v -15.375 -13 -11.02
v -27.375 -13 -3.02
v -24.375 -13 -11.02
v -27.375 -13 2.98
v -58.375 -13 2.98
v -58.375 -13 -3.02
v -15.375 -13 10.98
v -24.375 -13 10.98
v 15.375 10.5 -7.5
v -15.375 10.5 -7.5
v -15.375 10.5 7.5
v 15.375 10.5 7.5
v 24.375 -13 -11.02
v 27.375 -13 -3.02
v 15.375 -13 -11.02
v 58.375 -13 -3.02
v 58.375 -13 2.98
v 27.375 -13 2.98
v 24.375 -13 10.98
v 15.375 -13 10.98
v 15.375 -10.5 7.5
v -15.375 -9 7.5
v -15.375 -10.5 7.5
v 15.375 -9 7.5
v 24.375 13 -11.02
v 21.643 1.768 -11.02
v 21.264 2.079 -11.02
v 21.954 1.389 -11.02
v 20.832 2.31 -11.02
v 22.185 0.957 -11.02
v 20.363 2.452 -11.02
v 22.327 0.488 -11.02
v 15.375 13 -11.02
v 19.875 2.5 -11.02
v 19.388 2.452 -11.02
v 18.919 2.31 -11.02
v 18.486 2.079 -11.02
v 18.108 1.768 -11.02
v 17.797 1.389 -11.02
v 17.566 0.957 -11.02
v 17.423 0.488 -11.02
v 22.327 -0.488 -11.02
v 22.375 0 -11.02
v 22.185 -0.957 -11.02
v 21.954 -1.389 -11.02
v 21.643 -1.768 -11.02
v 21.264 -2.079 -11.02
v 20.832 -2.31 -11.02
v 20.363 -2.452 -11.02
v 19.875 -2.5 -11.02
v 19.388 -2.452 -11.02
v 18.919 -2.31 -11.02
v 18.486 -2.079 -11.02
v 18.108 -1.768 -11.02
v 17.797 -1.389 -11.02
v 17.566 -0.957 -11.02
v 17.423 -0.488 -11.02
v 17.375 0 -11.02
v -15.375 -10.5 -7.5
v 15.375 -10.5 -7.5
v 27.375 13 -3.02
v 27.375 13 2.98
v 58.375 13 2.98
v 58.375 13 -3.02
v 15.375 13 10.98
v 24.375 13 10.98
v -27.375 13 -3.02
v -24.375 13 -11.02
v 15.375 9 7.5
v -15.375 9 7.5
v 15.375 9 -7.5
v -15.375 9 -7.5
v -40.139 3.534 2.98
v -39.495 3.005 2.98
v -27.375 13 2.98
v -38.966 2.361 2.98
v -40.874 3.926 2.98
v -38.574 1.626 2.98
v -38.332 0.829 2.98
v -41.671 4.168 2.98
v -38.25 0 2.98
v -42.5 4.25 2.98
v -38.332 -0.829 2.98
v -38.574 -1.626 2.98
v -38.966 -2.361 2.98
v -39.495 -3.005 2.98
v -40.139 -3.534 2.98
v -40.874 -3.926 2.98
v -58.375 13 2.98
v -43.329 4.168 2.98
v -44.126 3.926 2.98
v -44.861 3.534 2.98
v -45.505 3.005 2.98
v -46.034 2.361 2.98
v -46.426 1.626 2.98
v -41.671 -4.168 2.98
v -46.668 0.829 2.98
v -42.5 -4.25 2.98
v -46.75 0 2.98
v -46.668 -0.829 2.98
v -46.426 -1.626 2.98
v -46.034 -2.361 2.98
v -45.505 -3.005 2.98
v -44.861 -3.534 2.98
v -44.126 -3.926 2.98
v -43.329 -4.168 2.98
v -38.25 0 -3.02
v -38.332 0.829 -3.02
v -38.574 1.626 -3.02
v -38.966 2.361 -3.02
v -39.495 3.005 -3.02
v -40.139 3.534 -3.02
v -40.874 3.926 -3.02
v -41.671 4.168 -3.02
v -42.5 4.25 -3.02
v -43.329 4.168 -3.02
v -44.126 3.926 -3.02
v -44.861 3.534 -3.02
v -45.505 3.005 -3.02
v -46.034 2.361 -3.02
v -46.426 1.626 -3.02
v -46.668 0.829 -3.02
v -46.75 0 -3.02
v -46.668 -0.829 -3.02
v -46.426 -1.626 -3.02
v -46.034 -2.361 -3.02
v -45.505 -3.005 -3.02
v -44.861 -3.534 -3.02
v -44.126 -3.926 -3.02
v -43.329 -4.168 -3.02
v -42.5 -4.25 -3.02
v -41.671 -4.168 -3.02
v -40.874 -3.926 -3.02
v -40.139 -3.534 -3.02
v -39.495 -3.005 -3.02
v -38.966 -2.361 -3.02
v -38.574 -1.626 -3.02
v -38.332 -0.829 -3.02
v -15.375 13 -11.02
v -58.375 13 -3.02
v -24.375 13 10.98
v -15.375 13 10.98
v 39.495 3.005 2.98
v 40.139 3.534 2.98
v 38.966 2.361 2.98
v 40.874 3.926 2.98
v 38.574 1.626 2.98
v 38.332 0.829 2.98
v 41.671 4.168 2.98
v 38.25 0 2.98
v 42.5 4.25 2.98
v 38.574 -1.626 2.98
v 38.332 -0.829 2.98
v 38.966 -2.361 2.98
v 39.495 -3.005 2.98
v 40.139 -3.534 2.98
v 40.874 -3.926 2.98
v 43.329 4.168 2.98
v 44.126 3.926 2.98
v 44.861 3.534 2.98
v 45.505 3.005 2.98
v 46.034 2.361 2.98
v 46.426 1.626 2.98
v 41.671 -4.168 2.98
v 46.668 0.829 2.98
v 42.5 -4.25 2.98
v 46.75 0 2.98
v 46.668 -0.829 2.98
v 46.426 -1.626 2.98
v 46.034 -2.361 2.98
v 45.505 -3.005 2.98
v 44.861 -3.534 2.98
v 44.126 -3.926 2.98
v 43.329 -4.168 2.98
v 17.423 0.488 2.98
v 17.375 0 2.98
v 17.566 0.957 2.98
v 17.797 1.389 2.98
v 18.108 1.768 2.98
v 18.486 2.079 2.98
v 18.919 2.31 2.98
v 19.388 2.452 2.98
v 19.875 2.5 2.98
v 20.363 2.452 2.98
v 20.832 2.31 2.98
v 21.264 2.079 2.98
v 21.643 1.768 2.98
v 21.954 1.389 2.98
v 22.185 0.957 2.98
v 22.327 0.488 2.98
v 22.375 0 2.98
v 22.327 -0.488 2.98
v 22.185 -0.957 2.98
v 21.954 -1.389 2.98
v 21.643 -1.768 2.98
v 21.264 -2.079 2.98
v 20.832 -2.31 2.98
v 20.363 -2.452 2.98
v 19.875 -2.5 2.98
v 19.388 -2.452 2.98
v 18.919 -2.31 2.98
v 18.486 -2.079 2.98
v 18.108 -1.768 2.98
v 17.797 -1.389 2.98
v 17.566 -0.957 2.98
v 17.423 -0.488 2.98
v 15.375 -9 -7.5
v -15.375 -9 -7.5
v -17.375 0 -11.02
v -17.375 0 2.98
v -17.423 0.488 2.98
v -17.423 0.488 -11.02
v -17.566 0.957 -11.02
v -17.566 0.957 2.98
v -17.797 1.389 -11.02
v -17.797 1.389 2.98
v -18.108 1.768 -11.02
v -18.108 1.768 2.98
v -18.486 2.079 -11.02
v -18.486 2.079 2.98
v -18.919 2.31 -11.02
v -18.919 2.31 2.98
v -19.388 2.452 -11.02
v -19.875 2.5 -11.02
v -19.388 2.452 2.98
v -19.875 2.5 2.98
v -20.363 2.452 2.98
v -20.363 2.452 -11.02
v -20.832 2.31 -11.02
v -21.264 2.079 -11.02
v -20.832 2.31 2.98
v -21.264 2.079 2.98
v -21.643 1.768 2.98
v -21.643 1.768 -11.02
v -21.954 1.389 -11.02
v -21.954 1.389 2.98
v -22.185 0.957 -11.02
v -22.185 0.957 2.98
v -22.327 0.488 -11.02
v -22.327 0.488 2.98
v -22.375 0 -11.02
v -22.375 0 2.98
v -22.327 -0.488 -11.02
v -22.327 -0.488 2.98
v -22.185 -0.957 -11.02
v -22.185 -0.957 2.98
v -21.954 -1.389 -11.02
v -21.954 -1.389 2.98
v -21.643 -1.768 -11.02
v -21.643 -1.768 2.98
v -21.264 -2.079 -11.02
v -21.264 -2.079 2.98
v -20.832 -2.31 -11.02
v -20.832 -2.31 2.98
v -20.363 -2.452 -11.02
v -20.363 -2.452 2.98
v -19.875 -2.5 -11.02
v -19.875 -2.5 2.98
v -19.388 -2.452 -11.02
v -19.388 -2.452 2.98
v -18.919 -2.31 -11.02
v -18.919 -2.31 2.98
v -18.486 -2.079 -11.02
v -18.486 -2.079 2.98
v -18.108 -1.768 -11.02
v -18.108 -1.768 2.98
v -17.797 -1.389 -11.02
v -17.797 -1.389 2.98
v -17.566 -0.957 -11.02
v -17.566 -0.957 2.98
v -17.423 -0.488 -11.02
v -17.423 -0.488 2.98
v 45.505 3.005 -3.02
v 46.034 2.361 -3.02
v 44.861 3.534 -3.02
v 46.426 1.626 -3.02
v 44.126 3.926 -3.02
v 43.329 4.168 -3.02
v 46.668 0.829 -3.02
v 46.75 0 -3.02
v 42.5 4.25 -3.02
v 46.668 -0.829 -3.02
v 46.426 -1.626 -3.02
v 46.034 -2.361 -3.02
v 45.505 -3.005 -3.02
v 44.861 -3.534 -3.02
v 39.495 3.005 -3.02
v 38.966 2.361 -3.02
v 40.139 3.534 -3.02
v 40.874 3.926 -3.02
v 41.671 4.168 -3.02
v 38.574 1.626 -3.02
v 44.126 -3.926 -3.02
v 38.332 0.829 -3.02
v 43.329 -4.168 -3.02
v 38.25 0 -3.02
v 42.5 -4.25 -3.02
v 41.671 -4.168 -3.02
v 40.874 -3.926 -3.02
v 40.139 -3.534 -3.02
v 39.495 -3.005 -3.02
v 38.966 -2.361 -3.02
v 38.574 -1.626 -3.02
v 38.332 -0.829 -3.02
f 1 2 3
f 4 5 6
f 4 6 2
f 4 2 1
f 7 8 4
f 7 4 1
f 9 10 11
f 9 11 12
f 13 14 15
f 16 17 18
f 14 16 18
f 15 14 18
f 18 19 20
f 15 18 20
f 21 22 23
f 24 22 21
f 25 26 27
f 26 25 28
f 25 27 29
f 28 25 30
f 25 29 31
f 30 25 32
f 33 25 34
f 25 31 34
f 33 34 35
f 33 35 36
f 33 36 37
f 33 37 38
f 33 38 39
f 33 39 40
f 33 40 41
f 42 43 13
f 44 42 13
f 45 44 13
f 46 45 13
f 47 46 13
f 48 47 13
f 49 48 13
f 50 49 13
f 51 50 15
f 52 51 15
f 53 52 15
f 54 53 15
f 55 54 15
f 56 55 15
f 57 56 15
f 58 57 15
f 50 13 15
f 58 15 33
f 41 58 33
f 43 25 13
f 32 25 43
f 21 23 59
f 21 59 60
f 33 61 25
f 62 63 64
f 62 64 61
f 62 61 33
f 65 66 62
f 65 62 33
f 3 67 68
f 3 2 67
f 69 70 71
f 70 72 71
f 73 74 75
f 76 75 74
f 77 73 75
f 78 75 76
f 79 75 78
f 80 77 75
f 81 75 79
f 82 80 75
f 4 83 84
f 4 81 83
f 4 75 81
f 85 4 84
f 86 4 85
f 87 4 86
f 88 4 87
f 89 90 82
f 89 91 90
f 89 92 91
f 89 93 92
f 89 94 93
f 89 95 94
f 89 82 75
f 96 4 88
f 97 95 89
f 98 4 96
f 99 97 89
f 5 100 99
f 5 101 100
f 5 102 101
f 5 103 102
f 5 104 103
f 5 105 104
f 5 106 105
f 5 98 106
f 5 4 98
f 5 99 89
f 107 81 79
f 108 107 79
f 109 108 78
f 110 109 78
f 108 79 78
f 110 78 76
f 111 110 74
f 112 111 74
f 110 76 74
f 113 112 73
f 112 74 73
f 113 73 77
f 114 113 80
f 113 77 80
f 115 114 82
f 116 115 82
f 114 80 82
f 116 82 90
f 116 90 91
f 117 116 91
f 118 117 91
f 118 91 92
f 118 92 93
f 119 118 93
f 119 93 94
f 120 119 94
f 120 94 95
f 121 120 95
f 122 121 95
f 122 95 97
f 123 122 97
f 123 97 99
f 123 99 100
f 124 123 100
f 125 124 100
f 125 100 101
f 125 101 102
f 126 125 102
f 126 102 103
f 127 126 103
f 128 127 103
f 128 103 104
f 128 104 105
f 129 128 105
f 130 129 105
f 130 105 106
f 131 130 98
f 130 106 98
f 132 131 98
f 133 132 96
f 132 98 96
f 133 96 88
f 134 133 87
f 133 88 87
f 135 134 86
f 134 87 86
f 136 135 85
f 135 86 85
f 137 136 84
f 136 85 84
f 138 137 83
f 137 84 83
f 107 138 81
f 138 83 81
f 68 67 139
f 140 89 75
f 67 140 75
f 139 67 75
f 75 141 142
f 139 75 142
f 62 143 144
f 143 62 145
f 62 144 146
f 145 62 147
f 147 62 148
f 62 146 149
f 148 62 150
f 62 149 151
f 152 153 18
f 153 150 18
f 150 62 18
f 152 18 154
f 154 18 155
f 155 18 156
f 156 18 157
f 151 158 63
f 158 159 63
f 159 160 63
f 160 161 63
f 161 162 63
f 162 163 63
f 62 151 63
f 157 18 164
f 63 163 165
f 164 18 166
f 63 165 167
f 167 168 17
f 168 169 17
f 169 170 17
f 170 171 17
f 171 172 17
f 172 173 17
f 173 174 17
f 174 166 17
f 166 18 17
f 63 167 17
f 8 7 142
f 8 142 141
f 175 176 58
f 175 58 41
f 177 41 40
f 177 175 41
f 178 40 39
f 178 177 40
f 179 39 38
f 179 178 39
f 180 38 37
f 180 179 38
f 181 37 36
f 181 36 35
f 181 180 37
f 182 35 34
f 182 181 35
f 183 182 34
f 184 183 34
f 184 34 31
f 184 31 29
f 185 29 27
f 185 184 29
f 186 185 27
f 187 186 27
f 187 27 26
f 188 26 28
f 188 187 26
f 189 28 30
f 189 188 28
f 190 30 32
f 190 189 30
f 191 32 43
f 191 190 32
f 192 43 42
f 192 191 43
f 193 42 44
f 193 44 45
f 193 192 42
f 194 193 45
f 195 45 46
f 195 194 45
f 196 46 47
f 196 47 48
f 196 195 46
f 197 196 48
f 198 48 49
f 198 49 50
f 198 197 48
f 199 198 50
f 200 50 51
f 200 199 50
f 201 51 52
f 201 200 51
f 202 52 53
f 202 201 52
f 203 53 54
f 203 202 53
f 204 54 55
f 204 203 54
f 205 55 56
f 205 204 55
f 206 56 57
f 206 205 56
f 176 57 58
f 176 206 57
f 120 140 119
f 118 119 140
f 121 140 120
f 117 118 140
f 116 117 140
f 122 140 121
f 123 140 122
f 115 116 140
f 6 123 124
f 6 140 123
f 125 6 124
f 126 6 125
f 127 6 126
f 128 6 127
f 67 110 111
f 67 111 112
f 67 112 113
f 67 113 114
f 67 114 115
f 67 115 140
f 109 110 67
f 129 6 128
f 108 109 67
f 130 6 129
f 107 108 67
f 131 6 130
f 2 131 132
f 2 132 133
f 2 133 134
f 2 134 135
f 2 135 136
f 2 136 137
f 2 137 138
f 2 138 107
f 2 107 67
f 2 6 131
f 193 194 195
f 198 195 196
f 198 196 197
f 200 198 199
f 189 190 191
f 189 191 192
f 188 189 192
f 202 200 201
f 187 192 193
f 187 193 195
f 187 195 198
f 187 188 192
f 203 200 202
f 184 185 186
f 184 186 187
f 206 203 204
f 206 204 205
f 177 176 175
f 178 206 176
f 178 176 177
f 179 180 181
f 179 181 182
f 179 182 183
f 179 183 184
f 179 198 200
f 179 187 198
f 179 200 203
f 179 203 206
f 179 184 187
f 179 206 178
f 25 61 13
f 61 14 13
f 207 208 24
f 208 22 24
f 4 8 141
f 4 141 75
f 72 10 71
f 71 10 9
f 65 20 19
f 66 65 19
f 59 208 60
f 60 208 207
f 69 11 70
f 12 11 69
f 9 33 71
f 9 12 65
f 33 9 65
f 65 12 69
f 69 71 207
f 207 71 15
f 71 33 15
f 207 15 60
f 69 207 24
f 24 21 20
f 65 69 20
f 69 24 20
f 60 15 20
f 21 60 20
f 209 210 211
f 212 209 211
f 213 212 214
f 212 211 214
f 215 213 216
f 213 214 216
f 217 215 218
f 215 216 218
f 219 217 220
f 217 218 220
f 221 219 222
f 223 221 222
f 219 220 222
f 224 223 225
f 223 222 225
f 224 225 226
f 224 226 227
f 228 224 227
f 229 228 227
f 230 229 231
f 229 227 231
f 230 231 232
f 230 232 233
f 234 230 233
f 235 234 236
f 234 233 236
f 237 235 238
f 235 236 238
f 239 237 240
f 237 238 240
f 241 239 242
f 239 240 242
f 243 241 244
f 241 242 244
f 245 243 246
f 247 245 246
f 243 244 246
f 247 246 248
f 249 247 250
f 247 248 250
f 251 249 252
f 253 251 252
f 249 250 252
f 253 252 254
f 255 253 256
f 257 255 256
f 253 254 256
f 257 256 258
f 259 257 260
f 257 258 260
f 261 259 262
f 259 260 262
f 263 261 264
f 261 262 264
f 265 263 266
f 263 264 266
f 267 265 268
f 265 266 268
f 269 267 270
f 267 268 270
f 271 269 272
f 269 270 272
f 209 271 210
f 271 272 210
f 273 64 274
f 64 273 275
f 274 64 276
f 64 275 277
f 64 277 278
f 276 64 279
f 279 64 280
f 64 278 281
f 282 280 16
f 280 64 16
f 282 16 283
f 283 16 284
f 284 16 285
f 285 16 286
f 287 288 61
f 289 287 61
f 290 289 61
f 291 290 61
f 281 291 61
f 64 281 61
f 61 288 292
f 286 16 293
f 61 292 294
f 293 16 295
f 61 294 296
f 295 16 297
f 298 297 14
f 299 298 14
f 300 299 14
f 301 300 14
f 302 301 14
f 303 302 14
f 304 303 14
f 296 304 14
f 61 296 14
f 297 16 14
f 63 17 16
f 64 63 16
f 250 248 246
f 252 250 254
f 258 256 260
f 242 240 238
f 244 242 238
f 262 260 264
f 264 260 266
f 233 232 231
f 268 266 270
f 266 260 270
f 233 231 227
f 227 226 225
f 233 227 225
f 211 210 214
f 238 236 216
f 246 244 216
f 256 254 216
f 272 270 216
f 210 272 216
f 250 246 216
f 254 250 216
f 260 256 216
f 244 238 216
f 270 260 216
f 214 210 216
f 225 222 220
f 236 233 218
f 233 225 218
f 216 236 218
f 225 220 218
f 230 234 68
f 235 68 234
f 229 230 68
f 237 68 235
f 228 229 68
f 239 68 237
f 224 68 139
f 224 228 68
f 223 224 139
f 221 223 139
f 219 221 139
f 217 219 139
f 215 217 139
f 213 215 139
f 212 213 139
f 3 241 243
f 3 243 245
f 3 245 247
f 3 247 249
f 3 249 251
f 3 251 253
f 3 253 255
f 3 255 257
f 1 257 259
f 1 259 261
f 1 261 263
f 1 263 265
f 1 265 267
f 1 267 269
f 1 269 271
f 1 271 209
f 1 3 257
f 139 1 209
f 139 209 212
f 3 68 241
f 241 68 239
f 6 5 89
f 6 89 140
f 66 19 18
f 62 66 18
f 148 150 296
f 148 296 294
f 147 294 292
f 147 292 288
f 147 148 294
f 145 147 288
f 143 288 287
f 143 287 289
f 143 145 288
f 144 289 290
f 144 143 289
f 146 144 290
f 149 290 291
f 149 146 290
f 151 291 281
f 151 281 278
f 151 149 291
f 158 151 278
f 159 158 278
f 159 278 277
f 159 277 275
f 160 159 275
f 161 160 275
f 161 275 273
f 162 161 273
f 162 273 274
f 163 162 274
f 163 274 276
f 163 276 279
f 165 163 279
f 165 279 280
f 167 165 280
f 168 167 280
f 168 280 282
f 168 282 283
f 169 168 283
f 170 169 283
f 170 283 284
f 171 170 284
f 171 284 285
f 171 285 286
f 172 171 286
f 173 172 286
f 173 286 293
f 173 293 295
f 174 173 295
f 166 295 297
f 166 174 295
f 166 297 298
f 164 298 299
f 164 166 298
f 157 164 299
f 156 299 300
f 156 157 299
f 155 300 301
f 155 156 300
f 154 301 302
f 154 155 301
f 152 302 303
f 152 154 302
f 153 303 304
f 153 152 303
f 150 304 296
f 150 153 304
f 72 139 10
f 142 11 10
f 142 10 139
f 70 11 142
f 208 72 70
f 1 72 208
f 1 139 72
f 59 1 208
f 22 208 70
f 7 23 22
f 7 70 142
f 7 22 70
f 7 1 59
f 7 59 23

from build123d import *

# Parameters (mm, degrees)
F1_DEPTH = 13
F2_R     = 4.25
F2_R_2   = 2.5
F3_DEPTH = 14
F5_W     = 30.750612
F5_H     = 1.5
F6_DEPTH = 7.5


with BuildPart() as f1:
    # F0 (on Front) → F1 (new body, symmetric)
    with BuildSketch(Plane.XZ):
        Polygon((-15.375306, -11.020302), (-15.375306, -8.878698), (-15.375306, 8.878698), (-15.375306, 10.979698), (-24.375306, 10.979698), (-27.375306, 2.979698), (-58.375306, 2.979698), (-58.375306, -3.020302), (-27.375306, -3.020302), (-24.375306, -11.020302), align=None)
    extrude(amount=F1_DEPTH, both=True)

    # F2 (on face) → F3 (cut, through all)
    with BuildSketch(Plane.XY.offset(2.979698)):
        with Locations((-42.5, 0)):
            Circle(F2_R)
        with Locations((-19.875306, 0)):
            Circle(F2_R_2)
    extrude(amount=-F3_DEPTH, mode=Mode.SUBTRACT)



with BuildPart() as f4_1:
    # F4: instance of F1
    add(f1.part.mirror(Plane.YZ))


with BuildPart() as f1_1:
    add(f1.part)

    add(f4_1.part)  # F6 merges F4_1
    # F5 (on Top) → F6 (join, symmetric)
    with BuildSketch(Plane.XY):
        with Locations((0, 9.75)):
            Rectangle(F5_W, F5_H)
        with Locations((0, -9.75)):
            Rectangle(F5_W, F5_H)
    extrude(amount=F6_DEPTH, both=True)


solid = f1_1.part
